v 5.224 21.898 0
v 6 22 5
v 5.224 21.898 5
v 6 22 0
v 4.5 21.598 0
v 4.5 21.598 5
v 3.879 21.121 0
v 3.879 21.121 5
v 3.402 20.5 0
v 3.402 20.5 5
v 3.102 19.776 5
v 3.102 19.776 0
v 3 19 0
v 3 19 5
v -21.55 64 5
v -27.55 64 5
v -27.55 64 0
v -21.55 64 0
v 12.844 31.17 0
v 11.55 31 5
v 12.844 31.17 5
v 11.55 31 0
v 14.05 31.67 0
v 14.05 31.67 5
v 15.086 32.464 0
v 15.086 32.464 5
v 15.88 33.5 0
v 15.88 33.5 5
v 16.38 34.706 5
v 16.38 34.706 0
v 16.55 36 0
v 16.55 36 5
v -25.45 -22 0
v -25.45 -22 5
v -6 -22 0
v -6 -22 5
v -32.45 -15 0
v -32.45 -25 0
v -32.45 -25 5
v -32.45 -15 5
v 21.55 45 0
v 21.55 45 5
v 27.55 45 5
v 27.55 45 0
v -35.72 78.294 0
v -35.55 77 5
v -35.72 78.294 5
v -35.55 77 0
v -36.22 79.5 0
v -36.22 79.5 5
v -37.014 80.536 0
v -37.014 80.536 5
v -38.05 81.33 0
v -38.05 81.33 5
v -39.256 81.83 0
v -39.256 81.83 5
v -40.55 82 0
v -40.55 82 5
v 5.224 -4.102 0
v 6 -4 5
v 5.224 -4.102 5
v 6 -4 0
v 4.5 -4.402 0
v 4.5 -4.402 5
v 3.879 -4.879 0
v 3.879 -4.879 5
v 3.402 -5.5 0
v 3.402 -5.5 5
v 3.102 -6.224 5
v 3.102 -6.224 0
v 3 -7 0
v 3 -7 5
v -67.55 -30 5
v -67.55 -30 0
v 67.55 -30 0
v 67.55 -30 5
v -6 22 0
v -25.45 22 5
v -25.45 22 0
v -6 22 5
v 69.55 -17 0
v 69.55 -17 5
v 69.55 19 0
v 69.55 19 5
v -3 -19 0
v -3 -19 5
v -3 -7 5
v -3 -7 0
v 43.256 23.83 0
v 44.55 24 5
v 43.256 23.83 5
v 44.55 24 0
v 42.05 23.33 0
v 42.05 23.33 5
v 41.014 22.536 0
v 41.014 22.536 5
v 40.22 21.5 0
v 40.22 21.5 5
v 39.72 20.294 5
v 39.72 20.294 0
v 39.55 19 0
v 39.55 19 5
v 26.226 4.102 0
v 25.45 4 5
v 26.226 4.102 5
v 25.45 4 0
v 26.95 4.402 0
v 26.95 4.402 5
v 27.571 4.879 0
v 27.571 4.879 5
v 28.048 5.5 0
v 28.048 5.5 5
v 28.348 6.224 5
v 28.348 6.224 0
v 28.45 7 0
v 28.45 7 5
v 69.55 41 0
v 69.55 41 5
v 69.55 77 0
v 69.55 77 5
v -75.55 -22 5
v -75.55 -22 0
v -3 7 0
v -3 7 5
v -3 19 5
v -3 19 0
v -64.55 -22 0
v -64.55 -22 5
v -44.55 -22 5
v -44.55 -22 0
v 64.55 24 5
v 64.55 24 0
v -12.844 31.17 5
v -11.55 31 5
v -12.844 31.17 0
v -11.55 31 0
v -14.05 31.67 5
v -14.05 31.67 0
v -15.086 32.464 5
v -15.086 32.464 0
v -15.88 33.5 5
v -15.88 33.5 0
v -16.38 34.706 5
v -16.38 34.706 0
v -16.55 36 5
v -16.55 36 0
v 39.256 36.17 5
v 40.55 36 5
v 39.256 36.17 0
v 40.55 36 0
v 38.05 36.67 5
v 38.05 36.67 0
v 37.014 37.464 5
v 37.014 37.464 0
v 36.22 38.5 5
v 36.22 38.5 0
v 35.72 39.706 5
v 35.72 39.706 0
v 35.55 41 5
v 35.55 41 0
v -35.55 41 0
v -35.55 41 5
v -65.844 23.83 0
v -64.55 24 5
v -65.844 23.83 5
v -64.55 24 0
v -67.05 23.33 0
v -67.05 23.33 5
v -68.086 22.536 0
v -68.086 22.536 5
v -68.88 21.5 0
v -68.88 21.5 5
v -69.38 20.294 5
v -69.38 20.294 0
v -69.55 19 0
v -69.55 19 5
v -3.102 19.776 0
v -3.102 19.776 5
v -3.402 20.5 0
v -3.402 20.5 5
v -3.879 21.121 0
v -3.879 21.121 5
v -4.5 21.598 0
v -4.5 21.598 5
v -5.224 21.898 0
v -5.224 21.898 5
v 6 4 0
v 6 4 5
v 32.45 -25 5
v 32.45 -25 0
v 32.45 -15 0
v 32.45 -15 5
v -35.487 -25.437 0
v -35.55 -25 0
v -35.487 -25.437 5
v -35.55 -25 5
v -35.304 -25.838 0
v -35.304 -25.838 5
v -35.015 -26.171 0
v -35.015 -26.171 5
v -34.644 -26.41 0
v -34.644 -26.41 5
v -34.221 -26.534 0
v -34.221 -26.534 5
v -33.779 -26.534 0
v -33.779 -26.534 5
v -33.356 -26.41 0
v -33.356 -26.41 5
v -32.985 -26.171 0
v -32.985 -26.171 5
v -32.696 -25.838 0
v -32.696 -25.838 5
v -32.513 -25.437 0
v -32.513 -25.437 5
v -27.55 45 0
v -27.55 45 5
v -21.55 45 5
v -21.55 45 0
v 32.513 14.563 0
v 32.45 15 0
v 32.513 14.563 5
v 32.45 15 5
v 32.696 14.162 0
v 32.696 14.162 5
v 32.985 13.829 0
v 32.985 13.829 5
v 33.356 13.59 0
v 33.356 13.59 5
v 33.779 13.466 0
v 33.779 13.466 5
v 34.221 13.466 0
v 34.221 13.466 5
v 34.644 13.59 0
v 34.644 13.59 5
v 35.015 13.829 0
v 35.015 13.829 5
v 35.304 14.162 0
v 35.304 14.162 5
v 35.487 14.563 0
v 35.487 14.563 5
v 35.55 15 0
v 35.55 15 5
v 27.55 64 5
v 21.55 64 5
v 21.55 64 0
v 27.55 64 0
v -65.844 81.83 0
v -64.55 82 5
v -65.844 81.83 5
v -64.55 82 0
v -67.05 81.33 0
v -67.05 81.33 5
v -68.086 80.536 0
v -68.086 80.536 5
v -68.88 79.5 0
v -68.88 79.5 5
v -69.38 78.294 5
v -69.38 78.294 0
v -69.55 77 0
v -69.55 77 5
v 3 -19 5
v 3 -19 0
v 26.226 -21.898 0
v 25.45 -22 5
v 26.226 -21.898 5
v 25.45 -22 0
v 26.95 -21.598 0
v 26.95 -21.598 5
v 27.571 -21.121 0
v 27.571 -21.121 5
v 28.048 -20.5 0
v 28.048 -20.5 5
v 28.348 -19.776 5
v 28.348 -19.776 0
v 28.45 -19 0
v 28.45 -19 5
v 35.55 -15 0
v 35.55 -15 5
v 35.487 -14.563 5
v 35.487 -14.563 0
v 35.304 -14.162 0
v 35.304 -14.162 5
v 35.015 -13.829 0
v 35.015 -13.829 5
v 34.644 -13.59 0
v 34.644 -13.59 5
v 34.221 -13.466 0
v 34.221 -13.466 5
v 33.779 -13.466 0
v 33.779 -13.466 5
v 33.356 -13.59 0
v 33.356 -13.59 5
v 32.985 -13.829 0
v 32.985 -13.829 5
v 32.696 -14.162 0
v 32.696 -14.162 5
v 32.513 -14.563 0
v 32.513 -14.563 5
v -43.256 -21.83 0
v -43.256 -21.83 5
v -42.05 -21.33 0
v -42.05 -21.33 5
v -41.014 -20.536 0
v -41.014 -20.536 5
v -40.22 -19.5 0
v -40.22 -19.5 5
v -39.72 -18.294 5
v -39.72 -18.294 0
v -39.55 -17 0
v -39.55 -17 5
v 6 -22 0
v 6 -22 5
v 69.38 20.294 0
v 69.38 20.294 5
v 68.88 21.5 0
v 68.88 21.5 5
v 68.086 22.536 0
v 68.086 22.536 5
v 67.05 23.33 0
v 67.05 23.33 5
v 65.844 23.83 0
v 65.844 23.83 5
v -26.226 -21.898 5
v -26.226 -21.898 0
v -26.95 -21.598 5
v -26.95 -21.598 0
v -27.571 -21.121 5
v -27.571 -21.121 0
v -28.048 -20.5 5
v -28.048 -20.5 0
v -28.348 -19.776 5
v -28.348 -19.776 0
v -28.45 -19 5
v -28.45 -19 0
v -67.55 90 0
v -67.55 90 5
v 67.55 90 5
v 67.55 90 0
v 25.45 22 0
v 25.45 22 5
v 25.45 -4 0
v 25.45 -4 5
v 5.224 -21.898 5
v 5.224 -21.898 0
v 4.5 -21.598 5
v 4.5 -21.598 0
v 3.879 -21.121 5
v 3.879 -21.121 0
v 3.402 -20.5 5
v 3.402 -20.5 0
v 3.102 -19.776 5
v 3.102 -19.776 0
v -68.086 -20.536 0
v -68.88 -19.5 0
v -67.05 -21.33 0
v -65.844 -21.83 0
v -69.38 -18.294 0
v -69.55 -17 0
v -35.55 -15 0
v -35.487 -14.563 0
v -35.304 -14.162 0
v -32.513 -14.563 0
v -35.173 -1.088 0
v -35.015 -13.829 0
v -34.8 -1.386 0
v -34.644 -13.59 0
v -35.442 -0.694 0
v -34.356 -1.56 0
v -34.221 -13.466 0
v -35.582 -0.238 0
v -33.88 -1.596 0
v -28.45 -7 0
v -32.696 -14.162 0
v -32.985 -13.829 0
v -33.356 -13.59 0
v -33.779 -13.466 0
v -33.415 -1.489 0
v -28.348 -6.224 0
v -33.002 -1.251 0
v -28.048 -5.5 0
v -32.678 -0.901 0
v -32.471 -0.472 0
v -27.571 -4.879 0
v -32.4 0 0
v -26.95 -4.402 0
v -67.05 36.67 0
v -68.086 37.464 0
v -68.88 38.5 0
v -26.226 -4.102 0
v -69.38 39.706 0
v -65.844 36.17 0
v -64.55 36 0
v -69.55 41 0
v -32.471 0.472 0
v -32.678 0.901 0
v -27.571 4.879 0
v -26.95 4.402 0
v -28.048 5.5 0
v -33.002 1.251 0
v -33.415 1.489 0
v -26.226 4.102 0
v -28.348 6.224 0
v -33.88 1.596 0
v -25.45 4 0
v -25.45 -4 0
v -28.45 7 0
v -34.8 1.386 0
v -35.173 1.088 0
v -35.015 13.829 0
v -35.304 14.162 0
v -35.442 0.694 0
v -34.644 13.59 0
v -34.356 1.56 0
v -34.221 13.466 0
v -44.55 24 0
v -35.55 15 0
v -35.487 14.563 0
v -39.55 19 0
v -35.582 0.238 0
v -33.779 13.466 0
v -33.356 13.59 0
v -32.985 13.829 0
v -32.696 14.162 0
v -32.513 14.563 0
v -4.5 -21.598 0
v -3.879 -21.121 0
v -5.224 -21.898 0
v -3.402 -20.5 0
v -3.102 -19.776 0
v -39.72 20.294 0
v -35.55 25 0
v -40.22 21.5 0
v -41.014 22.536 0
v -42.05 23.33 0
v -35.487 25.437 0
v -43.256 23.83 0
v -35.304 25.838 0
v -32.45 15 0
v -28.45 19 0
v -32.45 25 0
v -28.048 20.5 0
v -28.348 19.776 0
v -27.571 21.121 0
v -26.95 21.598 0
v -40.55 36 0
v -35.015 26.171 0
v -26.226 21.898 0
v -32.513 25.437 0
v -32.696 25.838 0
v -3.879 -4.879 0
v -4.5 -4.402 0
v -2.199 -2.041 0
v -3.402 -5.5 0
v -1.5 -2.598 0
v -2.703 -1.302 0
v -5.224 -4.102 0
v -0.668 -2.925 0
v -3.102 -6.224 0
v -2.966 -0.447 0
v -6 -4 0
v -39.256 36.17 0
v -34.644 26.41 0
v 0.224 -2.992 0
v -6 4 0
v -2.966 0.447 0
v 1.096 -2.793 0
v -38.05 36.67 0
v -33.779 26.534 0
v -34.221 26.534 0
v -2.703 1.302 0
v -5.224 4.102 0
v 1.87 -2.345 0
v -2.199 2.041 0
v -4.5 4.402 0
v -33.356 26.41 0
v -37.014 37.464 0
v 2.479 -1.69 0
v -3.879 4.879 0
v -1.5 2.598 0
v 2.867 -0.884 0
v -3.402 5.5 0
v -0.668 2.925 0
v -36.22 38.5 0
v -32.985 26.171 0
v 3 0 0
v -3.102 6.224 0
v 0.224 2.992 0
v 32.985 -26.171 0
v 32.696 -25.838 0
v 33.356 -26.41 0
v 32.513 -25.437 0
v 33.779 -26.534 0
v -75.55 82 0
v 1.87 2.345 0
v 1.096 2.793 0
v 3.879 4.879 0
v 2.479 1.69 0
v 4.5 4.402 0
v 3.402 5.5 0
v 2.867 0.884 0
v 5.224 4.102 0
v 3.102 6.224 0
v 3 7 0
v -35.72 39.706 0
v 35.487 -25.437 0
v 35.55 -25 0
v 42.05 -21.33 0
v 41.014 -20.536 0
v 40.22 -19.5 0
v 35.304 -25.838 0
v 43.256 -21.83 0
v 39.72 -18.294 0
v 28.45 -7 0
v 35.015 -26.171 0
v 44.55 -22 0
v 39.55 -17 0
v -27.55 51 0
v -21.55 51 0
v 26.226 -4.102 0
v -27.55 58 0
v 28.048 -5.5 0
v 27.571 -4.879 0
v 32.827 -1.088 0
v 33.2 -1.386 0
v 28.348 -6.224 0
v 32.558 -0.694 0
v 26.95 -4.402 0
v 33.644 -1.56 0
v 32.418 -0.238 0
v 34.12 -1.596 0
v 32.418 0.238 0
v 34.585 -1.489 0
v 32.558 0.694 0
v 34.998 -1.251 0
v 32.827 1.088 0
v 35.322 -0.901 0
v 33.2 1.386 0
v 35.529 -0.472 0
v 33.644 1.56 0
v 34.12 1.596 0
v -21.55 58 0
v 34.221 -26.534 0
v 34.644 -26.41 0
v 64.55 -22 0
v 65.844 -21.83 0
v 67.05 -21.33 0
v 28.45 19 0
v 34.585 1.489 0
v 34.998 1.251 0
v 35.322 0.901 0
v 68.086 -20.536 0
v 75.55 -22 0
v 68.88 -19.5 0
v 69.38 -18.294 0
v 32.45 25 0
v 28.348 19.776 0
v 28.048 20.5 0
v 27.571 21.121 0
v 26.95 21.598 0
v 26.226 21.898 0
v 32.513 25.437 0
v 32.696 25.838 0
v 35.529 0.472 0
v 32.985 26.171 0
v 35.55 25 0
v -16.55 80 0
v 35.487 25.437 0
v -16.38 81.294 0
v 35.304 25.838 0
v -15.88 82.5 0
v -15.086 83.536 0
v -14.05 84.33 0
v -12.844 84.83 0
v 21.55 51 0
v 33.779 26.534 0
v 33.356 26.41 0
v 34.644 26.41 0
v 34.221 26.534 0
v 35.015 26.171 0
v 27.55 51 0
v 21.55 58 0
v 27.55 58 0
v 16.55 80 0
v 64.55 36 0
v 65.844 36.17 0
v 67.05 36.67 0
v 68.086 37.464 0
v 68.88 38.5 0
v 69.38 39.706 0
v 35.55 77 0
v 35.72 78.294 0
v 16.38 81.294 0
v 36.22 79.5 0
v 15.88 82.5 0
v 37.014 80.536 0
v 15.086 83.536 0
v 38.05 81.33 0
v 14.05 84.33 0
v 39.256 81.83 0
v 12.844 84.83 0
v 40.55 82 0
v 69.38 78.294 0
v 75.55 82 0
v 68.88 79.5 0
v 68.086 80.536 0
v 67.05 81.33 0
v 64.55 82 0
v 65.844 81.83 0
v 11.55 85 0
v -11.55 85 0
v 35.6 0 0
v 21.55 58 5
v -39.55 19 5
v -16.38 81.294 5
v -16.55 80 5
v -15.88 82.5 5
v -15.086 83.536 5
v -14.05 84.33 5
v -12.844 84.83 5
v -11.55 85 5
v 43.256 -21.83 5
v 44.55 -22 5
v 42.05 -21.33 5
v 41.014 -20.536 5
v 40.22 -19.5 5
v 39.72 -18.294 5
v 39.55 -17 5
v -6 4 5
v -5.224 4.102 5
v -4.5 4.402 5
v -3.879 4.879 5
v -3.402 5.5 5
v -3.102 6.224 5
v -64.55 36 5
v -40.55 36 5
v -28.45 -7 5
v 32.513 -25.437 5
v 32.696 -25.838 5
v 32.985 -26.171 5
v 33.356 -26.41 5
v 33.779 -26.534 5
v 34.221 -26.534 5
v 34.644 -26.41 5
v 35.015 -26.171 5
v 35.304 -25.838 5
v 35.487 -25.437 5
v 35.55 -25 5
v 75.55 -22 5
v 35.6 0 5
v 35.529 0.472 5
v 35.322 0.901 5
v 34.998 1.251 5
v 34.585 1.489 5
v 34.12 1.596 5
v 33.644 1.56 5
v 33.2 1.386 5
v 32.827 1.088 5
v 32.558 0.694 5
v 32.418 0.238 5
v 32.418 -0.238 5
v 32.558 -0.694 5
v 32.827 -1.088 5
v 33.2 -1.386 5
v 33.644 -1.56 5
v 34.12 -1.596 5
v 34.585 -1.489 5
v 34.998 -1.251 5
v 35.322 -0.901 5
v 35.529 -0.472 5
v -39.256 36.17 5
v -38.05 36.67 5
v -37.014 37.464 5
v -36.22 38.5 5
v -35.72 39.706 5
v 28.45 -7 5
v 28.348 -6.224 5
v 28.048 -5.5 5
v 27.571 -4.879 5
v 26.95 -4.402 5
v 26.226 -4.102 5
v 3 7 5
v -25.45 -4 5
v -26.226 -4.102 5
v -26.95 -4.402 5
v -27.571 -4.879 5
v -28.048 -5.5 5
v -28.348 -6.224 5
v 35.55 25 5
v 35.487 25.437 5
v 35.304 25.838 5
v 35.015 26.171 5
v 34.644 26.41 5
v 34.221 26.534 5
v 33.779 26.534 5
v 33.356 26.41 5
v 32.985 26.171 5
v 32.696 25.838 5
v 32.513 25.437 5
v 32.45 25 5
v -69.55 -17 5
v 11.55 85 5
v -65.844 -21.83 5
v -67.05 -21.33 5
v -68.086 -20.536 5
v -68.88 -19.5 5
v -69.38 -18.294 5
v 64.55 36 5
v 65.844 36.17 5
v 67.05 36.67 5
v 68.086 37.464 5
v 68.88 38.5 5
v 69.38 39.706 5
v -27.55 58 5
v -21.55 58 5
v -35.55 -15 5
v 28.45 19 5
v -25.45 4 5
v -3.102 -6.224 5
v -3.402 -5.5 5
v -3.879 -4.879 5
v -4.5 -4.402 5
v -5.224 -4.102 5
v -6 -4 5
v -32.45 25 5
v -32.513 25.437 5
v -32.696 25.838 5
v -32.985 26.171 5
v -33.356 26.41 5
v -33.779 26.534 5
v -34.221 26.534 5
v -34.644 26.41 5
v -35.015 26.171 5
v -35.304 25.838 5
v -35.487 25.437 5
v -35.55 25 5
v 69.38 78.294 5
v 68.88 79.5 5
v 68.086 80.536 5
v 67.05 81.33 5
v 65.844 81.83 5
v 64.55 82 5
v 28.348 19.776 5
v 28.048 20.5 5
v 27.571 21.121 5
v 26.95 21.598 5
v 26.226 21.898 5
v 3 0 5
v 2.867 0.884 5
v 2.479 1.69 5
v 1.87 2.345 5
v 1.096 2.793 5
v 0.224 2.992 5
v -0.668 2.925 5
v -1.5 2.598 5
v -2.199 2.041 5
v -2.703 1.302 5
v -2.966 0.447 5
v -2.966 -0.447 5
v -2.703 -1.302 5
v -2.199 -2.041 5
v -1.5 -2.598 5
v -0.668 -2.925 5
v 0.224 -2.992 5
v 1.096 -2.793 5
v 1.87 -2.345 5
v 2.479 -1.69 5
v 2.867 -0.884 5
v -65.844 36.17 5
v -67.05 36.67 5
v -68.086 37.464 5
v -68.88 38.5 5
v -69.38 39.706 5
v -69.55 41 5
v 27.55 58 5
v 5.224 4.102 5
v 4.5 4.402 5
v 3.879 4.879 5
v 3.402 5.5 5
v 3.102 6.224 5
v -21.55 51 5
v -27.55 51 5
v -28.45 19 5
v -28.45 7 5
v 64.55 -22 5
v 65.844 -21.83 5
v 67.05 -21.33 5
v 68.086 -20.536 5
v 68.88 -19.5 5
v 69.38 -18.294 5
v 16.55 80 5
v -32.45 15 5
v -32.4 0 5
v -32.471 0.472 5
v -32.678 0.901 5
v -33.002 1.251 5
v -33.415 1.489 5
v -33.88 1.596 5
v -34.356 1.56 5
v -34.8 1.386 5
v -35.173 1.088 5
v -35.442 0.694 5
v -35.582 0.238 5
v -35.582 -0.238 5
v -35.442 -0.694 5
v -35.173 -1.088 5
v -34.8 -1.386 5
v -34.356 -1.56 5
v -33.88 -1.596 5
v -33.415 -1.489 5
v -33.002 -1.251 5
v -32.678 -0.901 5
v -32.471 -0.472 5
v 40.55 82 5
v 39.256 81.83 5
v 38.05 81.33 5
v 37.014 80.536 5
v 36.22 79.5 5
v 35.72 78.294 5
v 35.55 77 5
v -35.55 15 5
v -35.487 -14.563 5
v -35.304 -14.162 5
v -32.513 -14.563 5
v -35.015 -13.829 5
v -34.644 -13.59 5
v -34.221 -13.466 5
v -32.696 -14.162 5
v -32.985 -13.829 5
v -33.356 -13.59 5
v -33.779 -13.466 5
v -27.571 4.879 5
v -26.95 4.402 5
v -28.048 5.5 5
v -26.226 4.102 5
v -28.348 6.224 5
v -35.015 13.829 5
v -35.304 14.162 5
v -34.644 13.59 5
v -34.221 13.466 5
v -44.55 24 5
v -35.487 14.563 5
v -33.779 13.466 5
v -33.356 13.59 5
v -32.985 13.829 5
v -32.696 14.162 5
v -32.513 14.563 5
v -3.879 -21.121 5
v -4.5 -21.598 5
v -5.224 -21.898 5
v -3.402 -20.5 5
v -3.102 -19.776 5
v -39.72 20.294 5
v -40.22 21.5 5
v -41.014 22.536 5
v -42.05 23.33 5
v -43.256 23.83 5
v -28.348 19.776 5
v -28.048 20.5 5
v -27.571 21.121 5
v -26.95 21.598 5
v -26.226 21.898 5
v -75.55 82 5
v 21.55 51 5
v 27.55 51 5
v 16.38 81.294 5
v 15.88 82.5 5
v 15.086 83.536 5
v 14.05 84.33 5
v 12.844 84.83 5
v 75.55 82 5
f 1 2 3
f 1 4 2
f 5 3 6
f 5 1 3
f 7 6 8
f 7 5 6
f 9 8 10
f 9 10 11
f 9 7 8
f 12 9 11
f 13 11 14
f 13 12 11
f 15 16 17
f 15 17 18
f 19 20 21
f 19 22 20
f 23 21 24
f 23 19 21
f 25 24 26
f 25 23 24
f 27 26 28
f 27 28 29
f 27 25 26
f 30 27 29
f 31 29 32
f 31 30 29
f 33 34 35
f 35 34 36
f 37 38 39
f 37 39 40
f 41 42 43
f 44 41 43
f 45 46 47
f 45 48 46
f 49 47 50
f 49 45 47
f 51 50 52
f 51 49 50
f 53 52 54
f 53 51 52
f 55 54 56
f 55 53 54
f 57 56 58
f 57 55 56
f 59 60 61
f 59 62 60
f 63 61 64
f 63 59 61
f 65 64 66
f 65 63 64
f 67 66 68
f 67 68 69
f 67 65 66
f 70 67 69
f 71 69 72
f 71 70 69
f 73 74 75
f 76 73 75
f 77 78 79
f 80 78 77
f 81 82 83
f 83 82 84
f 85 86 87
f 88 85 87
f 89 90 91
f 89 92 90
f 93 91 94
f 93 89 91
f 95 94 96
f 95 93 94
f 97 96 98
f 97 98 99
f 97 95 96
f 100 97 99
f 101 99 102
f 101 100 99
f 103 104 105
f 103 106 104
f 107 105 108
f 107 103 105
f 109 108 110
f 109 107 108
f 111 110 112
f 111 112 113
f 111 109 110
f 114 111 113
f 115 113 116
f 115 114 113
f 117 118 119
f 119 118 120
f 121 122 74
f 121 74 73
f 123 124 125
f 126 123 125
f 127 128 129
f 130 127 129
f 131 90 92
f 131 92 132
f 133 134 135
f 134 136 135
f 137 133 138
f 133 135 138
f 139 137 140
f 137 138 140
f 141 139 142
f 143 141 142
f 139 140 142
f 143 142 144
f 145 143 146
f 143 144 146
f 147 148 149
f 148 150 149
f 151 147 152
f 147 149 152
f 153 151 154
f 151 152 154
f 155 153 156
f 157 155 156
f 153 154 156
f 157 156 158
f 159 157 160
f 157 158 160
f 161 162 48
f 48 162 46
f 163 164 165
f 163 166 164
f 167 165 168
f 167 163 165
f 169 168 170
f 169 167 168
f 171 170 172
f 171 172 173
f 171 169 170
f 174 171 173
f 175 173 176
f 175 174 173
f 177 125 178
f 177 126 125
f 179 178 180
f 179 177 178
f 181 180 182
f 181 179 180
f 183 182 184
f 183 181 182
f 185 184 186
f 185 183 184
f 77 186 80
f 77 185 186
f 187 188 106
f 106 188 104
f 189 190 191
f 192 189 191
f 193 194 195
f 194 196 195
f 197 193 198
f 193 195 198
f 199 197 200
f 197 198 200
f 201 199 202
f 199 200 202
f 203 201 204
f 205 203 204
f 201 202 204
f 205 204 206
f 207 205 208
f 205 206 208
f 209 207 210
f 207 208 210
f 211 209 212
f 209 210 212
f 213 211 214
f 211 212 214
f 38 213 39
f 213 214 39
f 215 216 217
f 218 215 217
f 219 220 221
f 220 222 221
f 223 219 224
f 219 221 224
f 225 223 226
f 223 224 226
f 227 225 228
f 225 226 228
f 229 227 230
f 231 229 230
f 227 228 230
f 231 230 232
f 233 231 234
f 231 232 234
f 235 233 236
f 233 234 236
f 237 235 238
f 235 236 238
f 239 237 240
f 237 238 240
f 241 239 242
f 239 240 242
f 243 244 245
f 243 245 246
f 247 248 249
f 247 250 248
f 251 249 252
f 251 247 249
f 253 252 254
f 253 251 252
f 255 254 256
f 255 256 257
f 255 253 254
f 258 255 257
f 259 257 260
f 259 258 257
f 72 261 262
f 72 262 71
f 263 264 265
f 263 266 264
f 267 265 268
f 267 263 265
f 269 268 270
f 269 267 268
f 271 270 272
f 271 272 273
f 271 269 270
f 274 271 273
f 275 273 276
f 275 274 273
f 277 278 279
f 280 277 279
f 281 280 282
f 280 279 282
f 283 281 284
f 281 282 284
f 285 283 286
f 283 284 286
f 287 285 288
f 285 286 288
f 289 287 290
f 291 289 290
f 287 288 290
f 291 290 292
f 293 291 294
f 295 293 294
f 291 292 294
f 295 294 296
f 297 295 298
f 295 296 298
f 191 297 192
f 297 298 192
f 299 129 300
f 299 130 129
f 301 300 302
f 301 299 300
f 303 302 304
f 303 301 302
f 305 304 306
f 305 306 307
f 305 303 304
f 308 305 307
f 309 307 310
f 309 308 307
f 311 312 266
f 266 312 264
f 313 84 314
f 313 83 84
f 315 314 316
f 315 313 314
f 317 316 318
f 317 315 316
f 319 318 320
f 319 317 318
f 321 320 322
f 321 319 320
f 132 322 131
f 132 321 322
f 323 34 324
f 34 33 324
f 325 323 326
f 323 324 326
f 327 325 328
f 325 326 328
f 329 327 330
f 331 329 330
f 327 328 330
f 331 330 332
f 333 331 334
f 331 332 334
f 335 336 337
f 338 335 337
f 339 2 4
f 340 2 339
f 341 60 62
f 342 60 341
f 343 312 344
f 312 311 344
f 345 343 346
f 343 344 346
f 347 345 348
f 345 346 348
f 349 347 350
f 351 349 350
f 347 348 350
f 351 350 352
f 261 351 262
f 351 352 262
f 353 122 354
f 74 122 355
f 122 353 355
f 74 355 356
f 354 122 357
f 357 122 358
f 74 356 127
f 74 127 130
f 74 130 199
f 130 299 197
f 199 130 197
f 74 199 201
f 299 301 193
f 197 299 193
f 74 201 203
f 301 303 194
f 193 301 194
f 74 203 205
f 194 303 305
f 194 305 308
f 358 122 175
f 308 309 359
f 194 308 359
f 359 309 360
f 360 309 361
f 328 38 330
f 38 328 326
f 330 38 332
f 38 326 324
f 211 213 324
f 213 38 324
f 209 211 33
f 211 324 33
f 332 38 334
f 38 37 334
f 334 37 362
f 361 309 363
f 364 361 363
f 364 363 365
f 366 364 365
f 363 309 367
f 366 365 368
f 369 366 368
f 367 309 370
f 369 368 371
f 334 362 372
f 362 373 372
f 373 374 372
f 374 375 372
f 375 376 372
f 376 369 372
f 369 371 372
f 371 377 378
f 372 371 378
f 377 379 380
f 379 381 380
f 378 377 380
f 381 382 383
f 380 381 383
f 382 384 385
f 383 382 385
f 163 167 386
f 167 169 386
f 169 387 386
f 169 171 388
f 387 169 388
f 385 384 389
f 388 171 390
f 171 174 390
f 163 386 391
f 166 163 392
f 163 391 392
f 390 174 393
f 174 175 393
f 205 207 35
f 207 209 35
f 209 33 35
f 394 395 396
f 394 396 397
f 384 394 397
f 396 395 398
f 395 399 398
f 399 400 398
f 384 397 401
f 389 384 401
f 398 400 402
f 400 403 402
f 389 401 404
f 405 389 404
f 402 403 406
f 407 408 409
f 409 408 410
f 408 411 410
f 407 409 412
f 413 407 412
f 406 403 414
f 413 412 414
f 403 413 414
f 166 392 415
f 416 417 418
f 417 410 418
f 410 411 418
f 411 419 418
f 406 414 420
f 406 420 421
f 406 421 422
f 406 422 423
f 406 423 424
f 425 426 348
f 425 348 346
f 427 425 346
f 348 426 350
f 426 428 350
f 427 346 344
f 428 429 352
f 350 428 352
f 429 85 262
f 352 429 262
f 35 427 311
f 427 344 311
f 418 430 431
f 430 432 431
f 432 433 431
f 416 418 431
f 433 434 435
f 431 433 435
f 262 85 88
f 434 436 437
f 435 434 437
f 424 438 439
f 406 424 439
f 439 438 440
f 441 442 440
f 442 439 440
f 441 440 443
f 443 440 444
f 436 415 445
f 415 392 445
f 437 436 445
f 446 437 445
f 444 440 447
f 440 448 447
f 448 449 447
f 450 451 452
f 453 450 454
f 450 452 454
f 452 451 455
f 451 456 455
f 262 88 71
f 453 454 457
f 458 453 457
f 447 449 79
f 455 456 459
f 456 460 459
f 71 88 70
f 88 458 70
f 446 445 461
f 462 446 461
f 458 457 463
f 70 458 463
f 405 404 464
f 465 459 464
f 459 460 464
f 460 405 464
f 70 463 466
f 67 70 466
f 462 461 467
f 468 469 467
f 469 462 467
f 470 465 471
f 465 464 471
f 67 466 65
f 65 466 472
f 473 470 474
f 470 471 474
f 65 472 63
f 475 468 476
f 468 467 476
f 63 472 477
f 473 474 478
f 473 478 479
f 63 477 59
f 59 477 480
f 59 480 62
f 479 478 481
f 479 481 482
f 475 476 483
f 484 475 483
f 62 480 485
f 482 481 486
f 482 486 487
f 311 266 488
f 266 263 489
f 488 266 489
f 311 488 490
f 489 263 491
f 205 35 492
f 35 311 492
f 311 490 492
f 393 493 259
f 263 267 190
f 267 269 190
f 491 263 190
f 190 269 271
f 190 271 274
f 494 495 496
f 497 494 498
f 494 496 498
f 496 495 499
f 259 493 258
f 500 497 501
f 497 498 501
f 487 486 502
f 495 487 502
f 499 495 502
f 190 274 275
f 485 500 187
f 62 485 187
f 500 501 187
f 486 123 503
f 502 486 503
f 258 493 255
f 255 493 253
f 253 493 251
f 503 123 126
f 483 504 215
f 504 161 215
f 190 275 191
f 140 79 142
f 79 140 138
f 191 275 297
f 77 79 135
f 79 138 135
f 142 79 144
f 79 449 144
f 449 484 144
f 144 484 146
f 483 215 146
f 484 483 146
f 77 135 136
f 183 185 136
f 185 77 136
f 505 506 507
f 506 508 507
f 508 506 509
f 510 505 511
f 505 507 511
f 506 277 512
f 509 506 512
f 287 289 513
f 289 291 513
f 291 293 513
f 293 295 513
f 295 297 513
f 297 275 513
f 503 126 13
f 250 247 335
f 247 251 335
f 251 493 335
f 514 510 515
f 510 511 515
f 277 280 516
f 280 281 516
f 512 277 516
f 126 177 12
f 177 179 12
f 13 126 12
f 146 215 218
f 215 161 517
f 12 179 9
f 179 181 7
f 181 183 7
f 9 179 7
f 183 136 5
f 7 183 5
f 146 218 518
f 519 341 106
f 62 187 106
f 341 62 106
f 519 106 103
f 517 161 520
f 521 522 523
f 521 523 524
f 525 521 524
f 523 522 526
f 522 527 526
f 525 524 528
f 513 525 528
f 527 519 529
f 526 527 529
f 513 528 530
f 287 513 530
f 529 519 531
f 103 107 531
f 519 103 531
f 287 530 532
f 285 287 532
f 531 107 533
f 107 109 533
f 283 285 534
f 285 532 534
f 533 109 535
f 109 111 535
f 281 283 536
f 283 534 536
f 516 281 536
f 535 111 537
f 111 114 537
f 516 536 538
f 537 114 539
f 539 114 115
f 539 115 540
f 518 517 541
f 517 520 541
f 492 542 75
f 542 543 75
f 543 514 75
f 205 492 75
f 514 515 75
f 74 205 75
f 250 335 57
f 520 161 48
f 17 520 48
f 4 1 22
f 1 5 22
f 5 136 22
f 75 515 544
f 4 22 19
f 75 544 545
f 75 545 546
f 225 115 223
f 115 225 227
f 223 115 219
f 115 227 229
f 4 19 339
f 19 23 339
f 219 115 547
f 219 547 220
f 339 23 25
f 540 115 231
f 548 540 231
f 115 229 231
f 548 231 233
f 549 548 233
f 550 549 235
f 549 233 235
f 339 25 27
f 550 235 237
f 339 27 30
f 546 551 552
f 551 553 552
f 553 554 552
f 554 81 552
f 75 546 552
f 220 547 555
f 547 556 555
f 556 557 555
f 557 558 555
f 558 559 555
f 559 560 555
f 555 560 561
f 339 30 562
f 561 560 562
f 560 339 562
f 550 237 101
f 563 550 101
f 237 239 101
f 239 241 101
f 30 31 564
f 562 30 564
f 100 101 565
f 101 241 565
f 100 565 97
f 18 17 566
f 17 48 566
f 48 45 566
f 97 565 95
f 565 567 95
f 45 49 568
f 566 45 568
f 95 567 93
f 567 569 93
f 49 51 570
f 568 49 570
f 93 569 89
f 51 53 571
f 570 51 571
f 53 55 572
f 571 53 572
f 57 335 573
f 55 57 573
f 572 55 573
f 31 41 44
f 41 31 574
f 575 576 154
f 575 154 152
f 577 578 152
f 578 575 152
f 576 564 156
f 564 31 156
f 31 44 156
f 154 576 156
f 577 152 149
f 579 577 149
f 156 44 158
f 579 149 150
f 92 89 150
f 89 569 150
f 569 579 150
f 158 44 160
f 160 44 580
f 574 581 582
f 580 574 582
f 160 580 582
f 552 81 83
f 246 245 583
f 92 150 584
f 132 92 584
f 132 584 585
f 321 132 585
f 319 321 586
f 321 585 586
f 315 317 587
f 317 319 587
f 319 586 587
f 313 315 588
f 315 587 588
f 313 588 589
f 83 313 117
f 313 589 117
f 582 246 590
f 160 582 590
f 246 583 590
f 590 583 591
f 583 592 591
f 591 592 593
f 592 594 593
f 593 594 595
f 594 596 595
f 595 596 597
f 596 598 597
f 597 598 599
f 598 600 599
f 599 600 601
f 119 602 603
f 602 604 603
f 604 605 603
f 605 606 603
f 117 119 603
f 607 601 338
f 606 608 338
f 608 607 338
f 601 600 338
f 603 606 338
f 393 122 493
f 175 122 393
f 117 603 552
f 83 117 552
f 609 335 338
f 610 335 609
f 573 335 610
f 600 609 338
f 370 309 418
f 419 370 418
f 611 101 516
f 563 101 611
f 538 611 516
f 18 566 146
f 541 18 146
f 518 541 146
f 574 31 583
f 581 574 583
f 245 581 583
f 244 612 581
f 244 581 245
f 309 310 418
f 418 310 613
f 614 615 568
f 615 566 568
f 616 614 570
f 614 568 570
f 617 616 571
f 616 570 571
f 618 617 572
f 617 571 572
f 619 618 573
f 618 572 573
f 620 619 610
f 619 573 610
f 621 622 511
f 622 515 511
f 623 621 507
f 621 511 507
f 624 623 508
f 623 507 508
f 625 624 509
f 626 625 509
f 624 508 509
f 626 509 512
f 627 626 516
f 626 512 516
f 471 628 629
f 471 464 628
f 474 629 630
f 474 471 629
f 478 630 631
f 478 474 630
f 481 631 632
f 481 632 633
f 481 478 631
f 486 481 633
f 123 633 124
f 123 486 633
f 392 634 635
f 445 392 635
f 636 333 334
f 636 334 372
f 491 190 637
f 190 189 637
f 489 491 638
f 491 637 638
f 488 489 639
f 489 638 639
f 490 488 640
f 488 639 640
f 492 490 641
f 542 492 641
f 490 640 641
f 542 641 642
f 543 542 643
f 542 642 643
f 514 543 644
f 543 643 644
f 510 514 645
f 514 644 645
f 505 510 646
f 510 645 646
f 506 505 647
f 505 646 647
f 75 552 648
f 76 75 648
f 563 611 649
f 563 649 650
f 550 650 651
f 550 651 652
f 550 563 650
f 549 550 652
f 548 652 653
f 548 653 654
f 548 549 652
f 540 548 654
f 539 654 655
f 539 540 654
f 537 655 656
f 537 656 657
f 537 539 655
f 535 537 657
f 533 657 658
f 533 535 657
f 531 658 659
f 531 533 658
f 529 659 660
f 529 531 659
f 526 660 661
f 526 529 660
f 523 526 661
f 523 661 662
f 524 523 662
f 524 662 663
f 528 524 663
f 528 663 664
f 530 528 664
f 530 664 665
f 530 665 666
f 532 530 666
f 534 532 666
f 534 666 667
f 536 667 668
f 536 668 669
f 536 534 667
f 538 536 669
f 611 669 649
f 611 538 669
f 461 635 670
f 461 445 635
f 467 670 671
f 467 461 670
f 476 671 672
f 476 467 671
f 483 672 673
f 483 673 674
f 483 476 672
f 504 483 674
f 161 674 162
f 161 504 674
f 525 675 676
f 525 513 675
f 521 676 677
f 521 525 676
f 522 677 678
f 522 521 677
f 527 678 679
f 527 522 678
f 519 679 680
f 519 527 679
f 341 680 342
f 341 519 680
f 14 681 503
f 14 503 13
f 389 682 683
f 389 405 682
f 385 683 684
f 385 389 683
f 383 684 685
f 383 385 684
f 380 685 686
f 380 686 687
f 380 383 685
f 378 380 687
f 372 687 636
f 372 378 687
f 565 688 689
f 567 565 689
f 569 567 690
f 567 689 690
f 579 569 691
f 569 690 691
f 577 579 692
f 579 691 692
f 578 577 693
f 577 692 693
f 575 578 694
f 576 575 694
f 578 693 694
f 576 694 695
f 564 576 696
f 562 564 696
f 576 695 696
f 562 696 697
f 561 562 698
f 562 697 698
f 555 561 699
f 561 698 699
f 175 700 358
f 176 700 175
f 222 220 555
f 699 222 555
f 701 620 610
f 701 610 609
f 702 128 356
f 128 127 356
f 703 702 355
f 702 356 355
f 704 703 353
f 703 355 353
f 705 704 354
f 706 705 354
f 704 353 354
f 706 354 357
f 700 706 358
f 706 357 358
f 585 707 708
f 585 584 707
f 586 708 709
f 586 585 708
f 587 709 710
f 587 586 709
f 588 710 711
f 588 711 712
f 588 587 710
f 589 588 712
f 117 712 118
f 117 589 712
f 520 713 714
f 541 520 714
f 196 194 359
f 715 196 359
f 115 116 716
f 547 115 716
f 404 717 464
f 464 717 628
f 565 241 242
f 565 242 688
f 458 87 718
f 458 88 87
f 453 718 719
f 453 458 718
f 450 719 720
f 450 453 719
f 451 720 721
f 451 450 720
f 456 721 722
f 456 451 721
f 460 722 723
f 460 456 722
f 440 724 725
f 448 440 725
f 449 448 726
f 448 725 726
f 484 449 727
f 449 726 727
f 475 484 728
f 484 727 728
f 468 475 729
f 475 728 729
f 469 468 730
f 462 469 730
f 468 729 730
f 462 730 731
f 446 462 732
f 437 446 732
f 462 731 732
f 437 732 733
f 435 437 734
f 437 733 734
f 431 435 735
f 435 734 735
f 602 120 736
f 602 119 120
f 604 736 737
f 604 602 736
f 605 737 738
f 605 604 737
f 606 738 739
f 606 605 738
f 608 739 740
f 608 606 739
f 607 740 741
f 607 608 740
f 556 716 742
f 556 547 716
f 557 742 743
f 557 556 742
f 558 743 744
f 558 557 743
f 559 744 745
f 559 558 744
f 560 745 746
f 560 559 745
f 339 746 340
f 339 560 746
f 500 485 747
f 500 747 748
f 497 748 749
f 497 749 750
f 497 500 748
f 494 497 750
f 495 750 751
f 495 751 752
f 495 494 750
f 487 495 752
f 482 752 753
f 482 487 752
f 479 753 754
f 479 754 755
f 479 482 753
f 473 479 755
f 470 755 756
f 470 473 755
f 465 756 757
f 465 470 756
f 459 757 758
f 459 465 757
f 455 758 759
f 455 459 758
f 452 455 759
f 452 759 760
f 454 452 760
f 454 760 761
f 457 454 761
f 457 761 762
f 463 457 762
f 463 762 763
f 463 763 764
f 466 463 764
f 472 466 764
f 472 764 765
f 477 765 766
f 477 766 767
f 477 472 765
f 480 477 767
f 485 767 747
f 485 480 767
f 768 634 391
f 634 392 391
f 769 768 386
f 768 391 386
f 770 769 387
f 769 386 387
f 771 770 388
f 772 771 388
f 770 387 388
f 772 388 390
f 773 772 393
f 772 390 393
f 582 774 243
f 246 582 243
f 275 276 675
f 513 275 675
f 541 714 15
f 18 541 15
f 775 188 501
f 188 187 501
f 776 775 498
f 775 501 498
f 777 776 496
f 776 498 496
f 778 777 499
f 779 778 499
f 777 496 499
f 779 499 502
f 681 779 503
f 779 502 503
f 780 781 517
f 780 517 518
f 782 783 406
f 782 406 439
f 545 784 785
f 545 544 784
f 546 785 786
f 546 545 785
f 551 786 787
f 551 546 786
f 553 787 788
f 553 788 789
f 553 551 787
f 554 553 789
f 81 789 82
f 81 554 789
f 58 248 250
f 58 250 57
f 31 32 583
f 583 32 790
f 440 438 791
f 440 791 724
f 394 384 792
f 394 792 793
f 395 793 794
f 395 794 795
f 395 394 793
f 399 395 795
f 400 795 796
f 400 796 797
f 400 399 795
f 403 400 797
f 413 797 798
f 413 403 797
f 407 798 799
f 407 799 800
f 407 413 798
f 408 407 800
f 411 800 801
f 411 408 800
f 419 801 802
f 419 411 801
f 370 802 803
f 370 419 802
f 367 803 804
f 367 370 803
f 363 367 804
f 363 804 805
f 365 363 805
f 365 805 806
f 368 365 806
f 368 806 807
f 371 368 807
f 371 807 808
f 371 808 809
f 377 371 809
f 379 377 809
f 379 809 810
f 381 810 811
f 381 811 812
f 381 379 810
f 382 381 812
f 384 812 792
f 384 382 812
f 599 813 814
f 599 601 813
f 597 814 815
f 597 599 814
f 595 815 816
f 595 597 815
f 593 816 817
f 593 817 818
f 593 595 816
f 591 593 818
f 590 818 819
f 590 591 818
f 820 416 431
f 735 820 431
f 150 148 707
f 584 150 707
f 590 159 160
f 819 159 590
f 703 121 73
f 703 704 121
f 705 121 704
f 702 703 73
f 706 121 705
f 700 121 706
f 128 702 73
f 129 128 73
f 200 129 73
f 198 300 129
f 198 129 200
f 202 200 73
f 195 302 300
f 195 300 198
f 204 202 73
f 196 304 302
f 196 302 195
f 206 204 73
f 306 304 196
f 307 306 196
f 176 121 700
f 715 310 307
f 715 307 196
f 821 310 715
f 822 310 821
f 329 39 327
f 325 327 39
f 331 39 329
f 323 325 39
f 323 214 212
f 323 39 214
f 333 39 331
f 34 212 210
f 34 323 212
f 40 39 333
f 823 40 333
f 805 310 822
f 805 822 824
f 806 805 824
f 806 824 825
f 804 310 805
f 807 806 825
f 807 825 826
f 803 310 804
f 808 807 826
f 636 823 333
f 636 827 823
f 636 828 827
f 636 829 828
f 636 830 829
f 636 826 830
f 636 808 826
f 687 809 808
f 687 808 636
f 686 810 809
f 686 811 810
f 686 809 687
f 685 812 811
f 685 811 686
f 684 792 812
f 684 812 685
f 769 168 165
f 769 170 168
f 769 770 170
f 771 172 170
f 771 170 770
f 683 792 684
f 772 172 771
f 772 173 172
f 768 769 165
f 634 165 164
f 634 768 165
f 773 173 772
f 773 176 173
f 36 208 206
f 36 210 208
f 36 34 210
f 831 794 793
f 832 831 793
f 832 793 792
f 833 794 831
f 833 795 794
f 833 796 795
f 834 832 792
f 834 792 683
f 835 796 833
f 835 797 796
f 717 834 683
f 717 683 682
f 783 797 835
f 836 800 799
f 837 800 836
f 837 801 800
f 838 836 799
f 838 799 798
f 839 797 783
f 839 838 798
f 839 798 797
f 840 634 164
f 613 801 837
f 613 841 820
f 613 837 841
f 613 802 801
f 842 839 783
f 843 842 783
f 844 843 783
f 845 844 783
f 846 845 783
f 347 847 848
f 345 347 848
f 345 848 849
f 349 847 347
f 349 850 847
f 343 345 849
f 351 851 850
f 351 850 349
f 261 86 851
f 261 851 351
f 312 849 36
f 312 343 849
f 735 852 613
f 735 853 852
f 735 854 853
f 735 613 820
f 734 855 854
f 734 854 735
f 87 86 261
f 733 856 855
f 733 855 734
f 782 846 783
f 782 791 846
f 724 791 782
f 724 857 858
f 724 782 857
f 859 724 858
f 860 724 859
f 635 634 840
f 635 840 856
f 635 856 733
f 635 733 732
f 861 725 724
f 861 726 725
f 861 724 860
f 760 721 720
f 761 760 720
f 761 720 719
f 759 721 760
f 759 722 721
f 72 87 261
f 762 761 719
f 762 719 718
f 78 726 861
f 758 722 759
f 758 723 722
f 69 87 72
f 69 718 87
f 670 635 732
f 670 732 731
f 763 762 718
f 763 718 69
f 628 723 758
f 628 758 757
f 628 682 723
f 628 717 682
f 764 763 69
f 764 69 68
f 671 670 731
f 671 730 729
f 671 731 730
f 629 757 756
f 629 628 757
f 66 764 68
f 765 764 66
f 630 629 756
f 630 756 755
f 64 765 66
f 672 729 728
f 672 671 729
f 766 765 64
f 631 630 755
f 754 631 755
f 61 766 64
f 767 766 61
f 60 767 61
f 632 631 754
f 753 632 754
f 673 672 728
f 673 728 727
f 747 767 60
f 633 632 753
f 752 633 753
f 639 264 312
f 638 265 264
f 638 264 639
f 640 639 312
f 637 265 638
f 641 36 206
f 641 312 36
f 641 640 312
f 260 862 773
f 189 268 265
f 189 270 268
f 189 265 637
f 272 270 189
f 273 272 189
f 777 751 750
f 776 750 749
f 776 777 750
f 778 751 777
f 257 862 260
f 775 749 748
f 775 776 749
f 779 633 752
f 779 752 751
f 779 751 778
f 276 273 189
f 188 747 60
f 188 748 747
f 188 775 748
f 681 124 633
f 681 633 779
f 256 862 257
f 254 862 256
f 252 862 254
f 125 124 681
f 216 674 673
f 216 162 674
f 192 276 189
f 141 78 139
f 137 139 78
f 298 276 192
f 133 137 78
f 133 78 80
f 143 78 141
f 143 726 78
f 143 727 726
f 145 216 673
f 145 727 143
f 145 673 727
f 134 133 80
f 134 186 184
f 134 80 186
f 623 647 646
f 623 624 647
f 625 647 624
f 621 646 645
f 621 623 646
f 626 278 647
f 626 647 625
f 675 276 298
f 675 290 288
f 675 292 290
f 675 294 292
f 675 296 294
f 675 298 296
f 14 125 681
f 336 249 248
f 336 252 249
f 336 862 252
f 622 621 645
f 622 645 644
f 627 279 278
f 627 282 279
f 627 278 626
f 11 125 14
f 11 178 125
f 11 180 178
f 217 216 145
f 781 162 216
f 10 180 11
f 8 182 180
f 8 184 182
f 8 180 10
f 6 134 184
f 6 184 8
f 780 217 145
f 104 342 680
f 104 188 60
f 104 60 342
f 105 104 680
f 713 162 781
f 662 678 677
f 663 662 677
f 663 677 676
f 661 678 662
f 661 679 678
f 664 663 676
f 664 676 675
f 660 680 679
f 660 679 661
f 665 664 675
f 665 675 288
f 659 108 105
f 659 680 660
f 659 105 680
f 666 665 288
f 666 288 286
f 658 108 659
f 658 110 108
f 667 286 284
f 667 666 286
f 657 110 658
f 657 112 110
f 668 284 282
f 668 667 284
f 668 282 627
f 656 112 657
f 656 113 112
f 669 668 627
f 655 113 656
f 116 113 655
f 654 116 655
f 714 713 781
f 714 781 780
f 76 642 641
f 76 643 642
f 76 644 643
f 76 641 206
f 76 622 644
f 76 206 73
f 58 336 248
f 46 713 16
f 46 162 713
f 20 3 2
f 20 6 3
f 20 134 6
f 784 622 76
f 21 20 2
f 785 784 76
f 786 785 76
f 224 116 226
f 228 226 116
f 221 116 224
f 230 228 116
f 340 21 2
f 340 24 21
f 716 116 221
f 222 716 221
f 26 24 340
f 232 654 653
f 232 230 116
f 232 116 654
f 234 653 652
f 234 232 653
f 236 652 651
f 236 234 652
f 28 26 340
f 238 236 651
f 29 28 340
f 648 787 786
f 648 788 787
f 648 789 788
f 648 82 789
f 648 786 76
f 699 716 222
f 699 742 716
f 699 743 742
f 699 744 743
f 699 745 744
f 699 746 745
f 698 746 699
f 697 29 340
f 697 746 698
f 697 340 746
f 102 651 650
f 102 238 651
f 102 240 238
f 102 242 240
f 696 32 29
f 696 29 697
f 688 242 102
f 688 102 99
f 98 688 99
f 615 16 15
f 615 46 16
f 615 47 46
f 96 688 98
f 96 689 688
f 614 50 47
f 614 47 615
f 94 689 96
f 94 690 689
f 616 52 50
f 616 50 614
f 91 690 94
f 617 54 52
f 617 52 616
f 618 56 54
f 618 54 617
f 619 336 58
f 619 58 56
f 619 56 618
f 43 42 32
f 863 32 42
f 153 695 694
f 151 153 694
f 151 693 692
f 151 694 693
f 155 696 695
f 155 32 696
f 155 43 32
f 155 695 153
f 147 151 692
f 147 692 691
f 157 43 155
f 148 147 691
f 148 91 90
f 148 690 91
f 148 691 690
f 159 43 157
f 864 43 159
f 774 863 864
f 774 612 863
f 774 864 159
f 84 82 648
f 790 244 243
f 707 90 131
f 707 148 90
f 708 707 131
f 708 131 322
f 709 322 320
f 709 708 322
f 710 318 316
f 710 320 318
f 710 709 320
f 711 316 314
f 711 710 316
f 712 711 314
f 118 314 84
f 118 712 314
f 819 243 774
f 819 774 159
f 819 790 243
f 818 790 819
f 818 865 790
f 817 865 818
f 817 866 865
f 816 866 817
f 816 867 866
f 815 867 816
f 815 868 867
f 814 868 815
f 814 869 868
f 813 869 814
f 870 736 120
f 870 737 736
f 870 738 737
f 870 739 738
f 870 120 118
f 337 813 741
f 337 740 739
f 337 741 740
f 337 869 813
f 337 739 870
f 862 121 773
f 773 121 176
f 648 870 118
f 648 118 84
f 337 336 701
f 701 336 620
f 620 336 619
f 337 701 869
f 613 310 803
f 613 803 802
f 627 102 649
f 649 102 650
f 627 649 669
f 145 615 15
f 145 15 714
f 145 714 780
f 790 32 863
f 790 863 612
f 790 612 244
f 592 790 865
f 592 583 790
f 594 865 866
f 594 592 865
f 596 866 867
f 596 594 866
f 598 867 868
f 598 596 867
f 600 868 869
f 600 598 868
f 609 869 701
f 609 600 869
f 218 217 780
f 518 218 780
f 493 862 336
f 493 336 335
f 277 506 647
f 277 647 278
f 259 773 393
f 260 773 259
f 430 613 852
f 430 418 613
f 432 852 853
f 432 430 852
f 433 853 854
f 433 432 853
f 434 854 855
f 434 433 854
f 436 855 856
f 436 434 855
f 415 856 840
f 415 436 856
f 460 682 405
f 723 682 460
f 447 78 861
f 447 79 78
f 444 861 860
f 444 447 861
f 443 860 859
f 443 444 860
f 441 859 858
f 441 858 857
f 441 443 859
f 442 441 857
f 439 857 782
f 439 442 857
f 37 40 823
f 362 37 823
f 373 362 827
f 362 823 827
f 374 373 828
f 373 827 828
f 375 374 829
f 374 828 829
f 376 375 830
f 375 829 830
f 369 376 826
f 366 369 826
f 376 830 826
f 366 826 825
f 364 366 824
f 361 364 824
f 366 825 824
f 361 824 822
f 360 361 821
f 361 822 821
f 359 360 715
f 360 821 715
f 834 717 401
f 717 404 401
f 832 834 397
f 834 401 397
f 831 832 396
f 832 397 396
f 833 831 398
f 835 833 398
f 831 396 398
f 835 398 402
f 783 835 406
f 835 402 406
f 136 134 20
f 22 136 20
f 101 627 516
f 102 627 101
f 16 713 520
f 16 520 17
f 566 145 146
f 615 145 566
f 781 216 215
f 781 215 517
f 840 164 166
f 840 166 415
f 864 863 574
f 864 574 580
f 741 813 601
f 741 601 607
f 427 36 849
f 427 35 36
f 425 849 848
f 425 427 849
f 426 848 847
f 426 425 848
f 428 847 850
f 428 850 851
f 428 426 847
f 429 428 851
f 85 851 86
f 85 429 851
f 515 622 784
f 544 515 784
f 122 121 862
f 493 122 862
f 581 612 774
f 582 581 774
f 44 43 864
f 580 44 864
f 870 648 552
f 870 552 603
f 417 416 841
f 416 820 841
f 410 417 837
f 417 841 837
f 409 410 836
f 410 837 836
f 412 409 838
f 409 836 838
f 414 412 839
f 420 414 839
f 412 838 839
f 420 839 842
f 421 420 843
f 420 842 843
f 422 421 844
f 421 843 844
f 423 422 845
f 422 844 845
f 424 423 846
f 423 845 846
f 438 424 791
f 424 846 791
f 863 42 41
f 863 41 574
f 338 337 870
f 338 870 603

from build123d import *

# Parameters (mm, degrees)
SKETCH_1_W          = 151.1
SKETCH_1_H          = 60
SKETCH_1_R          = 3
SKETCH_1_R_2        = 1.6
SKETCH_1_W_2        = 3.1
SKETCH_1_H_2        = 10
EXTRUDE_1_DEPTH     = 5
SKETCH_2_R          = 1.55
SKETCH_2_W          = 25.45
SKETCH_2_H          = 18
CUT_EXTRUDE_1_DEPTH = 82.442019253
FILLET_1_R          = 3
SKETCH_3_W          = 151.1
SKETCH_3_H          = 60
SKETCH_3_W_2        = 6
SKETCH_3_H_2        = 6
SKETCH_3_W_3        = 33.1
SKETCH_3_H_3        = 54
EXTRUDE_2_DEPTH     = 5
SKETCH_4_W          = 34
SKETCH_4_H          = 46
SKETCH_4_W_2        = 30
CUT_EXTRUDE_2_DEPTH = 118.612935088
FILLET_2_R          = 5
CHAMFER_1_SIZE      = 8


with BuildPart() as part:
    # 草图1 → 凸台-拉伸1 (new body)
    with BuildSketch(Plane.XY):
        Rectangle(SKETCH_1_W, SKETCH_1_H)
        Circle(SKETCH_1_R, mode=Mode.SUBTRACT)
        with Locations((34, 0)):
            Circle(SKETCH_1_R_2, mode=Mode.SUBTRACT)
        with Locations((-34, 0)):
            Circle(SKETCH_1_R_2, mode=Mode.SUBTRACT)
        with Locations((34, -20)):
            Rectangle(SKETCH_1_W_2, SKETCH_1_H_2, mode=Mode.SUBTRACT)
        with Locations((-34, 20)):
            Rectangle(SKETCH_1_W_2, SKETCH_1_H_2, mode=Mode.SUBTRACT)
        with Locations((-34, -20)):
            Rectangle(SKETCH_1_W_2, SKETCH_1_H_2, mode=Mode.SUBTRACT)
        with Locations((34, 20)):
            Rectangle(SKETCH_1_W_2, SKETCH_1_H_2, mode=Mode.SUBTRACT)
    extrude(amount=EXTRUDE_1_DEPTH)

    # 草图2 → 切除-拉伸1 (cut, through all)
    with BuildSketch(Plane.XY.offset(5)):
        with Locations((-34, 25)):
            Circle(SKETCH_2_R)
        with Locations((-34, 15)):
            Circle(SKETCH_2_R)
        with Locations((34, 25)):
            Circle(SKETCH_2_R)
        with Locations((34, 15)):
            Circle(SKETCH_2_R)
        with Locations((34, -15)):
            Circle(SKETCH_2_R)
        with Locations((34, -25)):
            Circle(SKETCH_2_R)
        with Locations((-34, -15)):
            Circle(SKETCH_2_R)
        with Locations((-34, -25)):
            Circle(SKETCH_2_R)
        with Locations((-15.725, 13)):
            Rectangle(SKETCH_2_W, SKETCH_2_H)
        with Locations((15.725, 13)):
            Rectangle(SKETCH_2_W, SKETCH_2_H)
        with Locations((-15.725, -13)):
            Rectangle(SKETCH_2_W, SKETCH_2_H)
        with Locations((15.725, -13)):
            Rectangle(SKETCH_2_W, SKETCH_2_H)
    extrude(amount=-CUT_EXTRUDE_1_DEPTH, mode=Mode.SUBTRACT)

    # 圆角1
    fillet_1_edges = [part.edges().sort_by_distance(p)[0] for p in [
        (28.45, 4, 2.5),
        (3, 4, 2.5),
        (3, 22, 2.5),
        (28.45, 22, 2.5),
        (-28.45, -22, 2.5),
        (-28.45, -4, 2.5),
        (-3, -4, 2.5),
        (-3, -22, 2.5),
        (28.45, -22, 2.5),
        (3, -22, 2.5),
        (3, -4, 2.5),
        (28.45, -4, 2.5),
        (-28.45, 4, 2.5),
        (-28.45, 22, 2.5),
        (-3, 22, 2.5),
        (-3, 4, 2.5),
    ]]
    fillet(fillet_1_edges, radius=FILLET_1_R)

    # 草图3 → 凸台-拉伸2 (add)
    with BuildSketch(Plane.XY.offset(5)):
        with Locations((0, 60)):
            Rectangle(SKETCH_3_W, SKETCH_3_H)
        with Locations((24.55, 48)):
            Rectangle(SKETCH_3_W_2, SKETCH_3_H_2, mode=Mode.SUBTRACT)
        with Locations((-24.55, 61)):
            Rectangle(SKETCH_3_W_2, SKETCH_3_H_2, mode=Mode.SUBTRACT)
        with Locations((-24.55, 48)):
            Rectangle(SKETCH_3_W_2, SKETCH_3_H_2, mode=Mode.SUBTRACT)
        with Locations((24.55, 61)):
            Rectangle(SKETCH_3_W_2, SKETCH_3_H_2, mode=Mode.SUBTRACT)
        with Locations((0, 58)):
            Rectangle(SKETCH_3_W_3, SKETCH_3_H_3, mode=Mode.SUBTRACT)
    extrude(amount=-EXTRUDE_2_DEPTH)

    # 草图4 → 切除-拉伸2 (cut, through all)
    with BuildSketch(Plane.XY.offset(5)):
        with Locations((-52.55, 59)):
            Rectangle(SKETCH_4_W, SKETCH_4_H)
        with Locations((-54.55, 1)):
            Rectangle(SKETCH_4_W_2, SKETCH_4_H)
        with Locations((54.55, 1)):
            Rectangle(SKETCH_4_W_2, SKETCH_4_H)
        with Locations((52.55, 59)):
            Rectangle(SKETCH_4_W, SKETCH_4_H)
    extrude(amount=-CUT_EXTRUDE_2_DEPTH, mode=Mode.SUBTRACT)

    # 圆角2
    fillet_2_edges = [part.edges().sort_by_distance(p)[0] for p in [
        (-16.55, 85, 2.5),
        (16.55, 85, 2.5),
        (16.55, 31, 2.5),
        (-16.55, 31, 2.5),
        (69.55, 82, 2.5),
        (69.55, 36, 2.5),
        (35.55, 36, 2.5),
        (35.55, 82, 2.5),
        (69.55, 24, 2.5),
        (69.55, -22, 2.5),
        (39.55, -22, 2.5),
        (39.55, 24, 2.5),
        (-69.55, -22, 2.5),
        (-69.55, 24, 2.5),
        (-39.55, 24, 2.5),
        (-39.55, -22, 2.5),
        (-69.55, 36, 2.5),
        (-69.55, 82, 2.5),
        (-35.55, 82, 2.5),
        (-35.55, 36, 2.5),
    ]]
    fillet(fillet_2_edges, radius=FILLET_2_R)

    # 倒角1
    chamfer_1_edges = [part.edges().sort_by_distance(p)[0] for p in [
        (-75.55, 90, 2.5),
        (75.55, 90, 2.5),
        (75.55, -30, 2.5),
        (-75.55, -30, 2.5),
    ]]
    chamfer(chamfer_1_edges, length=CHAMFER_1_SIZE)


solid = part.part
